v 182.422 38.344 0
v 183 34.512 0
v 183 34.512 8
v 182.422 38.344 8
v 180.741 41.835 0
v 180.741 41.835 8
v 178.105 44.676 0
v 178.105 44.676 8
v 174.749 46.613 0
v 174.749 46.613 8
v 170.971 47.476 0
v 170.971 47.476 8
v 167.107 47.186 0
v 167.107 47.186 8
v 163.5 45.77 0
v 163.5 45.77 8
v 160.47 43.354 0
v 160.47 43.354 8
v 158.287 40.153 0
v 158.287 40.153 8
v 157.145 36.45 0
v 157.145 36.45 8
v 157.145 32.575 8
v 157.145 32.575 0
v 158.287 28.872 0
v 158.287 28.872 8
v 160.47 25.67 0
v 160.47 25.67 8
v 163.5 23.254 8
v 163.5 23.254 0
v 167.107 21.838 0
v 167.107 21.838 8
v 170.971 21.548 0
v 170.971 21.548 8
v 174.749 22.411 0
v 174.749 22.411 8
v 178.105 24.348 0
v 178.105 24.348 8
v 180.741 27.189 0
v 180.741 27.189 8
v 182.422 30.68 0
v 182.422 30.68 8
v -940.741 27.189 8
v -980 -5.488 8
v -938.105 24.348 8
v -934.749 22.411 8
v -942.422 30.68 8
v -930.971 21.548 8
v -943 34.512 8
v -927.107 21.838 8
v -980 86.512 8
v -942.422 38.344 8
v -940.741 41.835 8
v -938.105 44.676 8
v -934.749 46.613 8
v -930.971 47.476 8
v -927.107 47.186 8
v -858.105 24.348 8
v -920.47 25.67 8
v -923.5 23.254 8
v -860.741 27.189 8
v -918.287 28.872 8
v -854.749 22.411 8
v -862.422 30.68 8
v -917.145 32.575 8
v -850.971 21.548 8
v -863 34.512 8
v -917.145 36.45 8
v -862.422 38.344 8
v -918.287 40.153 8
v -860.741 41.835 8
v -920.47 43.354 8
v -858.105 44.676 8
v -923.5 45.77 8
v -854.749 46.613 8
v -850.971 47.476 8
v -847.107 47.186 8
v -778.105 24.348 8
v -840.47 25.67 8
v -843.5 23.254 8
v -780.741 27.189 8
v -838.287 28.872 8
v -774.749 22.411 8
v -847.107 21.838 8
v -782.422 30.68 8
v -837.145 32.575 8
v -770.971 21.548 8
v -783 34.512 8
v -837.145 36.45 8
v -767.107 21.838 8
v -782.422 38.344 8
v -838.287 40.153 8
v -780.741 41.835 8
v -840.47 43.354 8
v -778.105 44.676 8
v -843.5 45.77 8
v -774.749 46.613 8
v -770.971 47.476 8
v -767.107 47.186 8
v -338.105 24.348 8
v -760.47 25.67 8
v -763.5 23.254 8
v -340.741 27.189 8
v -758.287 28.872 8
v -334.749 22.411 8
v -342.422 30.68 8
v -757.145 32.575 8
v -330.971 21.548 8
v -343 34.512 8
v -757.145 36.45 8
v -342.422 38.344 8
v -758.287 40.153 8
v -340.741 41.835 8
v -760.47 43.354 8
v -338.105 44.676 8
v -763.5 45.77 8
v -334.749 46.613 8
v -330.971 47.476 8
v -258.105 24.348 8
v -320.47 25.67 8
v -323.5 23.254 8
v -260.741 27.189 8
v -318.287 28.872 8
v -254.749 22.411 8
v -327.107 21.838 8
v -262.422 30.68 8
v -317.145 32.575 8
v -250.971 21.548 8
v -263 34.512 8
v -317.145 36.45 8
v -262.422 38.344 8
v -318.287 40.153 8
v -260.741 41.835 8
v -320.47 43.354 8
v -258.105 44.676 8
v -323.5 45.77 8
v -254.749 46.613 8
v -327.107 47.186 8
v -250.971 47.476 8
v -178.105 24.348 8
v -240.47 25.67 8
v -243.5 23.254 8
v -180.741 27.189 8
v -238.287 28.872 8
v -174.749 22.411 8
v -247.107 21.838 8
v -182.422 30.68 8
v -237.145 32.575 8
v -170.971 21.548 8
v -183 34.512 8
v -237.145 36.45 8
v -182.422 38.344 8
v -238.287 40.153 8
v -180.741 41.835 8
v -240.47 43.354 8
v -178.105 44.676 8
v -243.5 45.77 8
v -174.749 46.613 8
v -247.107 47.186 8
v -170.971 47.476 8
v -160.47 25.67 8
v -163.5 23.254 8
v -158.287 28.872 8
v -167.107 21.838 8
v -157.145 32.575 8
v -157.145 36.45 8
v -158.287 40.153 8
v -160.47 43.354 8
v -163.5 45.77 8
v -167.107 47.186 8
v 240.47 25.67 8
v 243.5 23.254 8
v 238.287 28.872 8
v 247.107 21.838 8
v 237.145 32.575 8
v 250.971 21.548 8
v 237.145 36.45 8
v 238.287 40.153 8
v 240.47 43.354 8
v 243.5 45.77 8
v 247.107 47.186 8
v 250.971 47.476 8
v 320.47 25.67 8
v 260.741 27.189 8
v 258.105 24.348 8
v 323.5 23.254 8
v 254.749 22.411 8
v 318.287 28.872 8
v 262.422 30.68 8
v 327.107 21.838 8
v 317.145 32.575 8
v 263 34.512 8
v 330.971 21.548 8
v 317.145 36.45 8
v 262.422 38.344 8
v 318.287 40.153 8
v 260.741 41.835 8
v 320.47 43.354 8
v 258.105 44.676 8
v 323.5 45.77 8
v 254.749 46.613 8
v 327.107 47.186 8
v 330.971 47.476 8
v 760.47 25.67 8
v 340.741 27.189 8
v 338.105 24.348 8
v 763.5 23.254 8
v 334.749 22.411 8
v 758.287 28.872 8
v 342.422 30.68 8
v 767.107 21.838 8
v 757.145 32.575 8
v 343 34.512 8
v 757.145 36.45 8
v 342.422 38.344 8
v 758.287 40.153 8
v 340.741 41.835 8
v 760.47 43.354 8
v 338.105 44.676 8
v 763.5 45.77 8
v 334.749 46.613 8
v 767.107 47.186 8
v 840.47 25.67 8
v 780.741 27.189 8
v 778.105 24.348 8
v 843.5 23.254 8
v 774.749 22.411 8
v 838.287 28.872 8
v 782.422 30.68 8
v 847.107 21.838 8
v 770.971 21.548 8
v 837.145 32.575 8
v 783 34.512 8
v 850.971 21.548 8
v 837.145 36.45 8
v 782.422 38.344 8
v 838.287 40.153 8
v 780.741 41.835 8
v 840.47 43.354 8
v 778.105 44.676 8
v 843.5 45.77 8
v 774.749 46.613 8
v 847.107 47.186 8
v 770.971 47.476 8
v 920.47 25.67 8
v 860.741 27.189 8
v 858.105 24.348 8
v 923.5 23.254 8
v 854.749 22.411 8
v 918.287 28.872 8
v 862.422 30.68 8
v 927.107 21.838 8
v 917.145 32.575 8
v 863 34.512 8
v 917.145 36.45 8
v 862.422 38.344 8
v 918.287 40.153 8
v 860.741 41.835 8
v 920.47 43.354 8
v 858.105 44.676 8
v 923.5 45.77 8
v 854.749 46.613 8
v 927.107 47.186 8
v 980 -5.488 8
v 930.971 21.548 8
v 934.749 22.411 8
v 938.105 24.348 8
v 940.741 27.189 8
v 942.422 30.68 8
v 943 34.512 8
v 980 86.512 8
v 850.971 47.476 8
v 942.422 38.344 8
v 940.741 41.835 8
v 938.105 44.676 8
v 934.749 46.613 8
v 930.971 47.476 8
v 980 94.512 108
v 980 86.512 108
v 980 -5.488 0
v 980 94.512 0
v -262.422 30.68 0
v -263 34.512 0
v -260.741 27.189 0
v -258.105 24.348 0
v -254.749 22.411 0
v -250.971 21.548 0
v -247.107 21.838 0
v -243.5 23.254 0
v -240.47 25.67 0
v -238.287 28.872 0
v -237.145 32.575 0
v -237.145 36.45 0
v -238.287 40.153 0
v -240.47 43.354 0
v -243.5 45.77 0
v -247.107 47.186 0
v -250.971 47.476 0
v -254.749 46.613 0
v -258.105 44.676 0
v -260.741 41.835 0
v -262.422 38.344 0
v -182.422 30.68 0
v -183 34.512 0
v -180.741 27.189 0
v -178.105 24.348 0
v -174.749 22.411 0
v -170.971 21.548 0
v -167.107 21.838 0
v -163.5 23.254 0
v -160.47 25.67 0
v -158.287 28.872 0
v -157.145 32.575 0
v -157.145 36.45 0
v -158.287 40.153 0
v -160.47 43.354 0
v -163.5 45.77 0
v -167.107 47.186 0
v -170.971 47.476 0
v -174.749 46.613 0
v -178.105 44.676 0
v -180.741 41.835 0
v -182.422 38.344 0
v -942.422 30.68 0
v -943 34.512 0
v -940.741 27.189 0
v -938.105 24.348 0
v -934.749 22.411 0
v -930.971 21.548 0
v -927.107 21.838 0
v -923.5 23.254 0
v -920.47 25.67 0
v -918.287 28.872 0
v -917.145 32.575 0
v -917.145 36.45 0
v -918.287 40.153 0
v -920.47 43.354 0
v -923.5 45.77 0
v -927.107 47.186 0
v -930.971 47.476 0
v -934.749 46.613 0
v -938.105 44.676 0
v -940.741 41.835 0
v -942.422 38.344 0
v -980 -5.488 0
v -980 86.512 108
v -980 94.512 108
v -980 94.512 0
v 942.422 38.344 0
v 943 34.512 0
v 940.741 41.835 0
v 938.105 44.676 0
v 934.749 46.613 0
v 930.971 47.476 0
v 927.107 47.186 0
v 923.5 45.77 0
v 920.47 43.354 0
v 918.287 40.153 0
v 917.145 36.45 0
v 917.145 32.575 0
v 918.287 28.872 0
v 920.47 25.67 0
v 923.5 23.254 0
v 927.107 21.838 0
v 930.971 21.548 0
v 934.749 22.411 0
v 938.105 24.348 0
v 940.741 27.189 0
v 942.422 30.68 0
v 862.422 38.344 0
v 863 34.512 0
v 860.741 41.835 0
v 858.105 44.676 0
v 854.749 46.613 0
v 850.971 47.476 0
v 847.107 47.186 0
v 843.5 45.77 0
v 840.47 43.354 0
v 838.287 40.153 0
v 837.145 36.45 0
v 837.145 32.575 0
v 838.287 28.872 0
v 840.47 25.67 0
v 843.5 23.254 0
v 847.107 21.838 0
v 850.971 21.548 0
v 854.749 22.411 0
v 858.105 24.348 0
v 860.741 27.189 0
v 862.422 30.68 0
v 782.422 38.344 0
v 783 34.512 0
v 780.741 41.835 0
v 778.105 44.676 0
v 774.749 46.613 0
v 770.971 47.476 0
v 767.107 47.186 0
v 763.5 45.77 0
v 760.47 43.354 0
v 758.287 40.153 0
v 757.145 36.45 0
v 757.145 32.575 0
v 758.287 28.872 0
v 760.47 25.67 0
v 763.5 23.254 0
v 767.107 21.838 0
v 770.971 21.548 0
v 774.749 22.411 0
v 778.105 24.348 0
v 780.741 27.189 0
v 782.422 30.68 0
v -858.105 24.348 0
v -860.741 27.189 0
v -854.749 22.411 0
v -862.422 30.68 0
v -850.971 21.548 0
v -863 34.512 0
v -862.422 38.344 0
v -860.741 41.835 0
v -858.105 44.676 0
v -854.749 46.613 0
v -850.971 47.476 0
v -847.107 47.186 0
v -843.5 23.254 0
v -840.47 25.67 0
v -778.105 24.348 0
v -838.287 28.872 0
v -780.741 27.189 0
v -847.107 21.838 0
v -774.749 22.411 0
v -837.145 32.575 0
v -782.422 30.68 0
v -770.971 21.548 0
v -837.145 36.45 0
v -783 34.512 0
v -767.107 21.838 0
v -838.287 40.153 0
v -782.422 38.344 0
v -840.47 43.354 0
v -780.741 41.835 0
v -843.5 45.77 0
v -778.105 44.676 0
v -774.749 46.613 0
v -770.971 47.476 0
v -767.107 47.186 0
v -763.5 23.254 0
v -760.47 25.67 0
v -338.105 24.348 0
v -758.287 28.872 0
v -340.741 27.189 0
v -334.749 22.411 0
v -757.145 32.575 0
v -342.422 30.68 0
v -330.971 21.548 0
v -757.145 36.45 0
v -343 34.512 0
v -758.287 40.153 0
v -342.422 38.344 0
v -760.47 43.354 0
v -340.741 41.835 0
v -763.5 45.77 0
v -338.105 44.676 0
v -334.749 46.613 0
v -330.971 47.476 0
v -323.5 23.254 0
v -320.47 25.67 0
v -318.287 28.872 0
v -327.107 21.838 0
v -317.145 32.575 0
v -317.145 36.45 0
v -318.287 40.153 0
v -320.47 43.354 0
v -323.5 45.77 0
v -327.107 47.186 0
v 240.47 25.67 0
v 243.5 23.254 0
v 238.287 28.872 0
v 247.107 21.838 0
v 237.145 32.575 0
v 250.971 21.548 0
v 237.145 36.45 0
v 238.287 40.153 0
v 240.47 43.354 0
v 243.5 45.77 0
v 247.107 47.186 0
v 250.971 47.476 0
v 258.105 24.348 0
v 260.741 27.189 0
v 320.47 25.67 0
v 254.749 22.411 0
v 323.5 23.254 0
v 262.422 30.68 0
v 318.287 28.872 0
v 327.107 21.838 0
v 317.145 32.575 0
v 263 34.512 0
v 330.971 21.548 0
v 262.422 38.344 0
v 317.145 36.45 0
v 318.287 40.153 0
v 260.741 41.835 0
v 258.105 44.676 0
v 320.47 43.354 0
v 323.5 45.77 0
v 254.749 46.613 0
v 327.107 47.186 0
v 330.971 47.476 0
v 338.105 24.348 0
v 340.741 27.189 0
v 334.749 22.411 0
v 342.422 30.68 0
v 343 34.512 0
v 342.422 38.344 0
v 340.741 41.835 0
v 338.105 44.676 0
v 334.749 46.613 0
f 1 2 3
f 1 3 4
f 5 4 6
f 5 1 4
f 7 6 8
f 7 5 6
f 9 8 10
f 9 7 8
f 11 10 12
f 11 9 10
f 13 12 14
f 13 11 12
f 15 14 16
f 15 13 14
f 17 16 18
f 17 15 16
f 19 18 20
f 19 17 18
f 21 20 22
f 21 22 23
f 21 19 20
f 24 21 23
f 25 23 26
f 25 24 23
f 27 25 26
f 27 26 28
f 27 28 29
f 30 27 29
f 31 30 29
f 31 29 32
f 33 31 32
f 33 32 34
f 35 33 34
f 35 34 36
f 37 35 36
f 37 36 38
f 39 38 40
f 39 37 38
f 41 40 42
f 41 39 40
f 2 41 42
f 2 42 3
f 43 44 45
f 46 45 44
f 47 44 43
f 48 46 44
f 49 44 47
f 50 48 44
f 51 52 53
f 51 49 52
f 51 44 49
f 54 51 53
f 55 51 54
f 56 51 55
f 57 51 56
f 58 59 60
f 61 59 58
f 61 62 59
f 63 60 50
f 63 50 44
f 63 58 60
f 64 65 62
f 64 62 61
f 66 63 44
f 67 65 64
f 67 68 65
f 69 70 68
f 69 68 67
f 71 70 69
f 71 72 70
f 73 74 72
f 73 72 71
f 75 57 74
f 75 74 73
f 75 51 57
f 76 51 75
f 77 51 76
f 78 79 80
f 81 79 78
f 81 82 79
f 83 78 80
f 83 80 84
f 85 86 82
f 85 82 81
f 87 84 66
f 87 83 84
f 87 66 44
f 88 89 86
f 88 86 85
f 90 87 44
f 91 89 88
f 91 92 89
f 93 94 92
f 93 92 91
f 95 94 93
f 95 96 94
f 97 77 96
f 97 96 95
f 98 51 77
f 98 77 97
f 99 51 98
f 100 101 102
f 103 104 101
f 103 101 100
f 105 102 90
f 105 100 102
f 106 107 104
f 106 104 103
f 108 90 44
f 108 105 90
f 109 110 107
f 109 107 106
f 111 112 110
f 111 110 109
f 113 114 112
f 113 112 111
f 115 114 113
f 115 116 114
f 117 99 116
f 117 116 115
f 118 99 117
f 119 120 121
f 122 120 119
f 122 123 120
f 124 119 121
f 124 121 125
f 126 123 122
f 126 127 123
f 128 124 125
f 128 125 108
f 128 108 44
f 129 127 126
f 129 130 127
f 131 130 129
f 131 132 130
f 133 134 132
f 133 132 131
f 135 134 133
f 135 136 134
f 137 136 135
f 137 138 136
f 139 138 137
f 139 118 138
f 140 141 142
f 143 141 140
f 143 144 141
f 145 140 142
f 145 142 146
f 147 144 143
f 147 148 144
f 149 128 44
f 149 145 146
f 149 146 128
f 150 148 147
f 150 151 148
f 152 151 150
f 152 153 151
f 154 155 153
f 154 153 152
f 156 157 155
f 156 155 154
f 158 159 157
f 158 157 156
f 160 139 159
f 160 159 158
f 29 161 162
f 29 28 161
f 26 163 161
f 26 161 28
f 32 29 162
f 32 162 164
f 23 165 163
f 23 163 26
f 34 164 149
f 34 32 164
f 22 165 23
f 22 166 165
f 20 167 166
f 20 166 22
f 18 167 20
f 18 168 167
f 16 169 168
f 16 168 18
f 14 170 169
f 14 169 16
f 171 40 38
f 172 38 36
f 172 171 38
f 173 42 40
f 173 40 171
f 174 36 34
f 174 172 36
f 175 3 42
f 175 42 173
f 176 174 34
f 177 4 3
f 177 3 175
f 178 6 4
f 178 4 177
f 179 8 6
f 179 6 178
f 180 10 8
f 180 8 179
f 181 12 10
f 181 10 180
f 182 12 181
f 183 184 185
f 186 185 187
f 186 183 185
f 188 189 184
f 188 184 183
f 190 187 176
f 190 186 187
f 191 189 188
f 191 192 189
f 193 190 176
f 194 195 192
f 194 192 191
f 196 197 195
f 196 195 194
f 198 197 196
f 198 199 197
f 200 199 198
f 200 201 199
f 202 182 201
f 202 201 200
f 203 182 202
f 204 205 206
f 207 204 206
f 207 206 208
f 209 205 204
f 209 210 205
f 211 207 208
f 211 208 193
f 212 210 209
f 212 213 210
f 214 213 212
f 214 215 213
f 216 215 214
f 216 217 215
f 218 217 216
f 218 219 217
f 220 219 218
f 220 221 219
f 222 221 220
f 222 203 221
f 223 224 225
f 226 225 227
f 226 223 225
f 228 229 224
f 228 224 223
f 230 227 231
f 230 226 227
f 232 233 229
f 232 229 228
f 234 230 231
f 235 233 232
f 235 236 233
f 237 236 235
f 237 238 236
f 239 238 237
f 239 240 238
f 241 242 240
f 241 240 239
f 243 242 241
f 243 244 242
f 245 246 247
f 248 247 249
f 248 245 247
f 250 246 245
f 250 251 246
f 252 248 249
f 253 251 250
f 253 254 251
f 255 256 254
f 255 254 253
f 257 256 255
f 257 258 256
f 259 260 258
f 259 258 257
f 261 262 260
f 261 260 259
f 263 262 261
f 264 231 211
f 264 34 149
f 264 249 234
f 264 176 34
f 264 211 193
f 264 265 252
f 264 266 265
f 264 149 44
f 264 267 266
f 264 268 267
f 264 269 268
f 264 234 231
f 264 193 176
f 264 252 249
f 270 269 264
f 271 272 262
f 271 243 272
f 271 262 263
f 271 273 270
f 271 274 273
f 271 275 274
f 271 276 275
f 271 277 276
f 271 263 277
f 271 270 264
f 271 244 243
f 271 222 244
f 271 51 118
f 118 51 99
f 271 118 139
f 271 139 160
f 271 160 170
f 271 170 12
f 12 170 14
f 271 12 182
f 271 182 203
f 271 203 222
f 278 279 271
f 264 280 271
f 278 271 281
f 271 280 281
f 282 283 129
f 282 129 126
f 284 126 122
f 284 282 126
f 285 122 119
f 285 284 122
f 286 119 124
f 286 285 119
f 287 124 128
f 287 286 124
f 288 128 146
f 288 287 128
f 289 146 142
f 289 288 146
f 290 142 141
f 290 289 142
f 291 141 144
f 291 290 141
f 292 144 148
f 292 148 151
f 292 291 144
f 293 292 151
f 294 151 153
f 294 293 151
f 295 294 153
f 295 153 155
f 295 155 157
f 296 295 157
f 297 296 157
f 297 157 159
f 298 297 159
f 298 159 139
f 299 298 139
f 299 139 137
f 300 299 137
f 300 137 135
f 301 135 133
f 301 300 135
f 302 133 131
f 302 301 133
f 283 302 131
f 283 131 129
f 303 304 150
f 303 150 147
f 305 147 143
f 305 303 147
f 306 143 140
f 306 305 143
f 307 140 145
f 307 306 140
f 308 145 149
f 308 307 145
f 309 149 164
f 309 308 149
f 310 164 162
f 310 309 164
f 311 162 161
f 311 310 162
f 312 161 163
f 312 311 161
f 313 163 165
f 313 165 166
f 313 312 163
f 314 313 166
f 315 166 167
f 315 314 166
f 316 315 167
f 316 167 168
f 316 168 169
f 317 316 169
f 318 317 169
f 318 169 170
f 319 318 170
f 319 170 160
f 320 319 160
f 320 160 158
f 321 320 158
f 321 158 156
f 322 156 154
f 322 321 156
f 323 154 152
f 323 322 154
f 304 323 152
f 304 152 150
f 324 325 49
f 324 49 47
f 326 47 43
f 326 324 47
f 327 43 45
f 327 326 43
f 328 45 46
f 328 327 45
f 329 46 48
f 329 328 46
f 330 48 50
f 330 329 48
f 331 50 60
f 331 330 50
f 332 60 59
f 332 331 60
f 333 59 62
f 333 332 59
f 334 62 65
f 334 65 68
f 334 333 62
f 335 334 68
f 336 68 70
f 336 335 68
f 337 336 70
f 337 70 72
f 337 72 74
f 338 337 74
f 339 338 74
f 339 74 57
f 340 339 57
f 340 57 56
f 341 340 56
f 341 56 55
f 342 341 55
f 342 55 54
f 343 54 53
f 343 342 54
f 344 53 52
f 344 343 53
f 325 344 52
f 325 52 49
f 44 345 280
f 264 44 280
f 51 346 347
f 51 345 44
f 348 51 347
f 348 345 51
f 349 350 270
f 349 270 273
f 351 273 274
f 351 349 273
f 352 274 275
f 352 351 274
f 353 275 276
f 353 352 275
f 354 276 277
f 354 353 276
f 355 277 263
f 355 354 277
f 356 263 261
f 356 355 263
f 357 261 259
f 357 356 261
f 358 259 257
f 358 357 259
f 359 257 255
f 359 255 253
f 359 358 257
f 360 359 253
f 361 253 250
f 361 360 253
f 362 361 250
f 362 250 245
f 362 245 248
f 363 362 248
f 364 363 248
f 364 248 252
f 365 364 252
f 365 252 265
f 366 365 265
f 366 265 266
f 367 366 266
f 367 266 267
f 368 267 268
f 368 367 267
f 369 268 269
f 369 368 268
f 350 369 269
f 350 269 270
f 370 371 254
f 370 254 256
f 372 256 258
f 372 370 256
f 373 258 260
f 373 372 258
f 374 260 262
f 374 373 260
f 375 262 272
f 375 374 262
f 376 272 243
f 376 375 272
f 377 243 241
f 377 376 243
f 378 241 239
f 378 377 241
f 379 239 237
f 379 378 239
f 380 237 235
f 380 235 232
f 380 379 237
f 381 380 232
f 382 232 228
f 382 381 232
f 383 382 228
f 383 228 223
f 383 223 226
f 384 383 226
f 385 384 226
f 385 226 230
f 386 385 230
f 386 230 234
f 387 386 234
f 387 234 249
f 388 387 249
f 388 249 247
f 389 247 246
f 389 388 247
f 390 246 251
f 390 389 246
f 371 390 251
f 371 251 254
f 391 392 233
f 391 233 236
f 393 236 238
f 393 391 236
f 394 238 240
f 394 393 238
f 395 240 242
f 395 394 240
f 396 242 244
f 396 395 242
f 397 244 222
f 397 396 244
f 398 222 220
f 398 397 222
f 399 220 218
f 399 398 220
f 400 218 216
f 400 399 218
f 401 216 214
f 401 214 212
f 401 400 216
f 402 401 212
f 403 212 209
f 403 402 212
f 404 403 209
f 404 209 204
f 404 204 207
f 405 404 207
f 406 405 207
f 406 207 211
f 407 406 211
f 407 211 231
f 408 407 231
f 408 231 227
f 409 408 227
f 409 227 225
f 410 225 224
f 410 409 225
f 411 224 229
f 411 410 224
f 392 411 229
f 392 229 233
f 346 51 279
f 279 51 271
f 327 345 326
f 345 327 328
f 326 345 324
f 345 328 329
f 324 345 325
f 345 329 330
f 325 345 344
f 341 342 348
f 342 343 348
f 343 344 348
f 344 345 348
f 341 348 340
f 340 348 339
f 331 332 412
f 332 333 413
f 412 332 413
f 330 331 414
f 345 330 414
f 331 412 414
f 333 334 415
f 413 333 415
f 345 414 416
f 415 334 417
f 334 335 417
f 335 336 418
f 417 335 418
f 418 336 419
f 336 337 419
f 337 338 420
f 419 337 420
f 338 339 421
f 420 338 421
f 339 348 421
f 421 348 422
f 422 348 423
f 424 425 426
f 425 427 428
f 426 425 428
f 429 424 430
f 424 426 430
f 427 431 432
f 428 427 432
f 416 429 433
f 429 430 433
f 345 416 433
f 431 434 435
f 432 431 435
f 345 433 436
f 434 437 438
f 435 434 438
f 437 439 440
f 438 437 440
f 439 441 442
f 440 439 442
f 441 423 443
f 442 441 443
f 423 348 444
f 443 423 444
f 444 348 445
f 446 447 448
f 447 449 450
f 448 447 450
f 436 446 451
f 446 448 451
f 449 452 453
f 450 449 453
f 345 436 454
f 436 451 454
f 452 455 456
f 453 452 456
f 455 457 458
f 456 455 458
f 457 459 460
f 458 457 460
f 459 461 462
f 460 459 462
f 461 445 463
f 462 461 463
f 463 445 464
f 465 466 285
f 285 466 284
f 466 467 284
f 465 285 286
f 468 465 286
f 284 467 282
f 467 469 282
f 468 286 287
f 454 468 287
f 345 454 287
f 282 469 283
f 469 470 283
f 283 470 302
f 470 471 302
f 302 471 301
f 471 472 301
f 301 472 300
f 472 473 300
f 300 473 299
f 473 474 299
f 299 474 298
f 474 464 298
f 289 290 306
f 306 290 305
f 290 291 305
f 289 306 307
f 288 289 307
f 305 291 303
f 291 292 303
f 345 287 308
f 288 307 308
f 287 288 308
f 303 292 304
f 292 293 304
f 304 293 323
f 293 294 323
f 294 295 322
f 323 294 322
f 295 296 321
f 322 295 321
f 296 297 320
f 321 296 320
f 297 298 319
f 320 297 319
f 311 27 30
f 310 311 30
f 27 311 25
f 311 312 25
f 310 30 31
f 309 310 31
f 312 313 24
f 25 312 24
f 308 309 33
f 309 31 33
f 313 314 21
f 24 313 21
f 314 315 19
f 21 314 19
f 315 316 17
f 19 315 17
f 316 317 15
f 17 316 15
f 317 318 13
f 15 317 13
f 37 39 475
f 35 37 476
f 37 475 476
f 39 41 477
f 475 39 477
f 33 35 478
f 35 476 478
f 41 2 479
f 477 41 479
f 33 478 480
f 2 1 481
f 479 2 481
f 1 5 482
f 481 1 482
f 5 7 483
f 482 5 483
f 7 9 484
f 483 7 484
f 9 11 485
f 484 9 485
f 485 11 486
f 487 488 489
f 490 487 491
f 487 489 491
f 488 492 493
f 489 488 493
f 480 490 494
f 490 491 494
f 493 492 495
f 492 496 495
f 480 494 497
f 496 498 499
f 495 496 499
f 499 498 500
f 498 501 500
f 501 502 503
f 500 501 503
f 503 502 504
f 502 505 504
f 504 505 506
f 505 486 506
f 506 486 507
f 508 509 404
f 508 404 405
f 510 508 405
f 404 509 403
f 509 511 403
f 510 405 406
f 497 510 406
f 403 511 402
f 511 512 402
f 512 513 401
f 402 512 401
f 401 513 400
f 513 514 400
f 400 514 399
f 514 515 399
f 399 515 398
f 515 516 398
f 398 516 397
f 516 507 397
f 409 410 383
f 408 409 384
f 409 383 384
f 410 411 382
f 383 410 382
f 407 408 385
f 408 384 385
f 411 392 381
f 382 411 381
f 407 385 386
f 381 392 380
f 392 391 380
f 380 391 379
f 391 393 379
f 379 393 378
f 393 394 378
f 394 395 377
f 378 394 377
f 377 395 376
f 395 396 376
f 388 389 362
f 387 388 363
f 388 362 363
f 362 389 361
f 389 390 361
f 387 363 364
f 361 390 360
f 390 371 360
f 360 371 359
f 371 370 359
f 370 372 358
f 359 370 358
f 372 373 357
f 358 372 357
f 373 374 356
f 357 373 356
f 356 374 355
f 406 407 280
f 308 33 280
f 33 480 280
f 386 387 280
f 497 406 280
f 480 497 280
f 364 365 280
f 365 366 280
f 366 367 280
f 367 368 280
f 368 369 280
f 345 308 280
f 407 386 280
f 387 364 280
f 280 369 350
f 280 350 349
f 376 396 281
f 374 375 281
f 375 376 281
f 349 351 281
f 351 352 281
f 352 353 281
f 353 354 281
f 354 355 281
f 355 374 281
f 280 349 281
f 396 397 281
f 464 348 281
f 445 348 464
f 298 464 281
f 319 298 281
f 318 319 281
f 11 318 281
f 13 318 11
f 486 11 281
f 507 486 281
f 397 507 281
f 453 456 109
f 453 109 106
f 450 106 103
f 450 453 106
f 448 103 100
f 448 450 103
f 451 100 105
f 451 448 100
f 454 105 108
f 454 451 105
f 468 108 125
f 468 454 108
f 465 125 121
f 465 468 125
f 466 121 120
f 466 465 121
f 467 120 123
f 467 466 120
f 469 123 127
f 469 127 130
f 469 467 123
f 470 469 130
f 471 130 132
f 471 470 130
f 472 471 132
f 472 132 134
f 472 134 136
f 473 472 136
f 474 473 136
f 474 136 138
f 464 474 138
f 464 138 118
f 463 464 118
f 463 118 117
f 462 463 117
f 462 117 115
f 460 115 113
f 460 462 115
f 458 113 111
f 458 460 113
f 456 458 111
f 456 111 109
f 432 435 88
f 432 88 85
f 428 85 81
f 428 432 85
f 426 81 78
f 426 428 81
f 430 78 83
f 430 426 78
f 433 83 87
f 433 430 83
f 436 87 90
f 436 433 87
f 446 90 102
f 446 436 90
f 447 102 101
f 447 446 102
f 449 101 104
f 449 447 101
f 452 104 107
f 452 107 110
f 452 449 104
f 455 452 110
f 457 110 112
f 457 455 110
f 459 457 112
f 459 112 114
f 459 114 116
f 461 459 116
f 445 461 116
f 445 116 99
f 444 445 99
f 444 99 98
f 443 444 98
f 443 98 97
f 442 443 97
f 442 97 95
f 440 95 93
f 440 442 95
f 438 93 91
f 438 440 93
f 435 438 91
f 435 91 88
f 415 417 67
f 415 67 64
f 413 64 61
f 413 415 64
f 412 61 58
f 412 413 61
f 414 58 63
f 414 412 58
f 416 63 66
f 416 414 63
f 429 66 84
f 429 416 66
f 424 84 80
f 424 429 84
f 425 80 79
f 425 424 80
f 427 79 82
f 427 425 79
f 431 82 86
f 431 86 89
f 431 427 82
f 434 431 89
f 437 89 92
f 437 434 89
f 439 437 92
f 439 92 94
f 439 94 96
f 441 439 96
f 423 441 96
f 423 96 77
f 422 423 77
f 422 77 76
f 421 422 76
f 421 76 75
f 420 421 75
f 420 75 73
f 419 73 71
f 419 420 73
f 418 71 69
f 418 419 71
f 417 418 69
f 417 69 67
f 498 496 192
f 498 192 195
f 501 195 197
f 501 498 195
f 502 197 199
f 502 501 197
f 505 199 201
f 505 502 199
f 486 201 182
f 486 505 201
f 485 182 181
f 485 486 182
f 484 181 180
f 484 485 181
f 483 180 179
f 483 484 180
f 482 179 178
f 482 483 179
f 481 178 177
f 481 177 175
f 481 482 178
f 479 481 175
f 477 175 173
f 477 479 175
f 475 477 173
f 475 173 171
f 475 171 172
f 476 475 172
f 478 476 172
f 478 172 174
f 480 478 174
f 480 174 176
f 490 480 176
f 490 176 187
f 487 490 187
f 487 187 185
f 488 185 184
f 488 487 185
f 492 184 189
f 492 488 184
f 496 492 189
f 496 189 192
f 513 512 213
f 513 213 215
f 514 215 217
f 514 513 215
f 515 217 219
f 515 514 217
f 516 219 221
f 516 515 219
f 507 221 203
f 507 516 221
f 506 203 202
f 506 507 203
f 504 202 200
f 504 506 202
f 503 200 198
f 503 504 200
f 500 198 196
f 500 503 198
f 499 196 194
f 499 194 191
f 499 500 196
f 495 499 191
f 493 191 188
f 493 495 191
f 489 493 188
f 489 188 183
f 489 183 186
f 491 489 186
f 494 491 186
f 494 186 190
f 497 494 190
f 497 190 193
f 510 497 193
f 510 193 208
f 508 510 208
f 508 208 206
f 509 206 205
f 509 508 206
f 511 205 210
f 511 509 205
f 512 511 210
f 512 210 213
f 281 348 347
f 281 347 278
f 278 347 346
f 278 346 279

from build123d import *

# Parameters (mm, degrees)
SKETCH_1_W        = 1960
SKETCH_1_H        = 100
SKETCH_1_R        = 13
EXTRUDE_708_DEPTH = 8
SKETCH_2_W        = 1960
SKETCH_2_H        = 8
EXTRUDE_1_DEPTH   = 100


with BuildPart() as part:
    # 草图1 → Extrude 708 (new body)
    with BuildSketch(Plane.XY):
        with Locations((0, 44.512115183)):
            Rectangle(SKETCH_1_W, SKETCH_1_H)
        with Locations((930, 34.512115183)):
            Circle(SKETCH_1_R, mode=Mode.SUBTRACT)
        with Locations((850, 34.512115183)):
            Circle(SKETCH_1_R, mode=Mode.SUBTRACT)
        with Locations((770, 34.512115183)):
            Circle(SKETCH_1_R, mode=Mode.SUBTRACT)
        with Locations((330, 34.512115183)):
            Circle(SKETCH_1_R, mode=Mode.SUBTRACT)
        with Locations((250, 34.512115183)):
            Circle(SKETCH_1_R, mode=Mode.SUBTRACT)
        with Locations(Location((-770, 34.512115183, 0), (0, 0, 180))):
            Circle(SKETCH_1_R, mode=Mode.SUBTRACT)
        with Locations(Location((-850, 34.512115183, 0), (0, 0, 180))):
            Circle(SKETCH_1_R, mode=Mode.SUBTRACT)
        with Locations((170, 34.512115183)):
            Circle(SKETCH_1_R, mode=Mode.SUBTRACT)
        with Locations(Location((-170, 34.512115183, 0), (0, 0, 180))):
            Circle(SKETCH_1_R, mode=Mode.SUBTRACT)
        with Locations(Location((-250, 34.512115183, 0), (0, 0, 180))):
            Circle(SKETCH_1_R, mode=Mode.SUBTRACT)
        with Locations(Location((-330, 34.512115183, 0), (0, 0, 180))):
            Circle(SKETCH_1_R, mode=Mode.SUBTRACT)
        with Locations(Location((-930, 34.512115183, 0), (0, 0, 180))):
            Circle(SKETCH_1_R, mode=Mode.SUBTRACT)
    extrude(amount=EXTRUDE_708_DEPTH)

    # 草图2 → 凸台-拉伸1 (add)
    with BuildSketch(Plane.XY.offset(8)):
        with Locations((0, 90.512115183)):
            Rectangle(SKETCH_2_W, SKETCH_2_H)
    extrude(amount=EXTRUDE_1_DEPTH)


solid = part.part
